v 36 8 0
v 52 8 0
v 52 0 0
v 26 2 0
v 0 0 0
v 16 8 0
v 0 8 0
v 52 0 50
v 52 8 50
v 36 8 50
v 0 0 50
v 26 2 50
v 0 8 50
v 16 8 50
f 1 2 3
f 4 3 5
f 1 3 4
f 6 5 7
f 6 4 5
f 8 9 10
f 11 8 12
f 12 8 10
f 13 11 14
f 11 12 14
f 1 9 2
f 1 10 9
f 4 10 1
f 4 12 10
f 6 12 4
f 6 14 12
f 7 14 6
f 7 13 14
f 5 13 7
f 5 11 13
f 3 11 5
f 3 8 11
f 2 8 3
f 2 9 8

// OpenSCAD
$fn = 32;

// ----------------------------------------------------------------------
// V guide rail: vway, 52 mm wide
// ----------------------------------------------------------------------

// --- parameters (mm) ---
rail_w = 52;              // rail width, X
base_t = 8;               // base plate thickness
v_depth = 6;              // V feature depth / height
v_half_w = 10;            // half width of the V at the base face
plate_t = 50;             // rail length, Z (the extrusion height)

profile = [[0, 0], [52, 0], [52, 8], [36, 8], [26, 2], [16, 8], [0, 8]];  // primary outline, 7 points, counter clockwise

// --- the one profile operation ---
linear_extrude(height = plate_t) polygon(points = profile);
